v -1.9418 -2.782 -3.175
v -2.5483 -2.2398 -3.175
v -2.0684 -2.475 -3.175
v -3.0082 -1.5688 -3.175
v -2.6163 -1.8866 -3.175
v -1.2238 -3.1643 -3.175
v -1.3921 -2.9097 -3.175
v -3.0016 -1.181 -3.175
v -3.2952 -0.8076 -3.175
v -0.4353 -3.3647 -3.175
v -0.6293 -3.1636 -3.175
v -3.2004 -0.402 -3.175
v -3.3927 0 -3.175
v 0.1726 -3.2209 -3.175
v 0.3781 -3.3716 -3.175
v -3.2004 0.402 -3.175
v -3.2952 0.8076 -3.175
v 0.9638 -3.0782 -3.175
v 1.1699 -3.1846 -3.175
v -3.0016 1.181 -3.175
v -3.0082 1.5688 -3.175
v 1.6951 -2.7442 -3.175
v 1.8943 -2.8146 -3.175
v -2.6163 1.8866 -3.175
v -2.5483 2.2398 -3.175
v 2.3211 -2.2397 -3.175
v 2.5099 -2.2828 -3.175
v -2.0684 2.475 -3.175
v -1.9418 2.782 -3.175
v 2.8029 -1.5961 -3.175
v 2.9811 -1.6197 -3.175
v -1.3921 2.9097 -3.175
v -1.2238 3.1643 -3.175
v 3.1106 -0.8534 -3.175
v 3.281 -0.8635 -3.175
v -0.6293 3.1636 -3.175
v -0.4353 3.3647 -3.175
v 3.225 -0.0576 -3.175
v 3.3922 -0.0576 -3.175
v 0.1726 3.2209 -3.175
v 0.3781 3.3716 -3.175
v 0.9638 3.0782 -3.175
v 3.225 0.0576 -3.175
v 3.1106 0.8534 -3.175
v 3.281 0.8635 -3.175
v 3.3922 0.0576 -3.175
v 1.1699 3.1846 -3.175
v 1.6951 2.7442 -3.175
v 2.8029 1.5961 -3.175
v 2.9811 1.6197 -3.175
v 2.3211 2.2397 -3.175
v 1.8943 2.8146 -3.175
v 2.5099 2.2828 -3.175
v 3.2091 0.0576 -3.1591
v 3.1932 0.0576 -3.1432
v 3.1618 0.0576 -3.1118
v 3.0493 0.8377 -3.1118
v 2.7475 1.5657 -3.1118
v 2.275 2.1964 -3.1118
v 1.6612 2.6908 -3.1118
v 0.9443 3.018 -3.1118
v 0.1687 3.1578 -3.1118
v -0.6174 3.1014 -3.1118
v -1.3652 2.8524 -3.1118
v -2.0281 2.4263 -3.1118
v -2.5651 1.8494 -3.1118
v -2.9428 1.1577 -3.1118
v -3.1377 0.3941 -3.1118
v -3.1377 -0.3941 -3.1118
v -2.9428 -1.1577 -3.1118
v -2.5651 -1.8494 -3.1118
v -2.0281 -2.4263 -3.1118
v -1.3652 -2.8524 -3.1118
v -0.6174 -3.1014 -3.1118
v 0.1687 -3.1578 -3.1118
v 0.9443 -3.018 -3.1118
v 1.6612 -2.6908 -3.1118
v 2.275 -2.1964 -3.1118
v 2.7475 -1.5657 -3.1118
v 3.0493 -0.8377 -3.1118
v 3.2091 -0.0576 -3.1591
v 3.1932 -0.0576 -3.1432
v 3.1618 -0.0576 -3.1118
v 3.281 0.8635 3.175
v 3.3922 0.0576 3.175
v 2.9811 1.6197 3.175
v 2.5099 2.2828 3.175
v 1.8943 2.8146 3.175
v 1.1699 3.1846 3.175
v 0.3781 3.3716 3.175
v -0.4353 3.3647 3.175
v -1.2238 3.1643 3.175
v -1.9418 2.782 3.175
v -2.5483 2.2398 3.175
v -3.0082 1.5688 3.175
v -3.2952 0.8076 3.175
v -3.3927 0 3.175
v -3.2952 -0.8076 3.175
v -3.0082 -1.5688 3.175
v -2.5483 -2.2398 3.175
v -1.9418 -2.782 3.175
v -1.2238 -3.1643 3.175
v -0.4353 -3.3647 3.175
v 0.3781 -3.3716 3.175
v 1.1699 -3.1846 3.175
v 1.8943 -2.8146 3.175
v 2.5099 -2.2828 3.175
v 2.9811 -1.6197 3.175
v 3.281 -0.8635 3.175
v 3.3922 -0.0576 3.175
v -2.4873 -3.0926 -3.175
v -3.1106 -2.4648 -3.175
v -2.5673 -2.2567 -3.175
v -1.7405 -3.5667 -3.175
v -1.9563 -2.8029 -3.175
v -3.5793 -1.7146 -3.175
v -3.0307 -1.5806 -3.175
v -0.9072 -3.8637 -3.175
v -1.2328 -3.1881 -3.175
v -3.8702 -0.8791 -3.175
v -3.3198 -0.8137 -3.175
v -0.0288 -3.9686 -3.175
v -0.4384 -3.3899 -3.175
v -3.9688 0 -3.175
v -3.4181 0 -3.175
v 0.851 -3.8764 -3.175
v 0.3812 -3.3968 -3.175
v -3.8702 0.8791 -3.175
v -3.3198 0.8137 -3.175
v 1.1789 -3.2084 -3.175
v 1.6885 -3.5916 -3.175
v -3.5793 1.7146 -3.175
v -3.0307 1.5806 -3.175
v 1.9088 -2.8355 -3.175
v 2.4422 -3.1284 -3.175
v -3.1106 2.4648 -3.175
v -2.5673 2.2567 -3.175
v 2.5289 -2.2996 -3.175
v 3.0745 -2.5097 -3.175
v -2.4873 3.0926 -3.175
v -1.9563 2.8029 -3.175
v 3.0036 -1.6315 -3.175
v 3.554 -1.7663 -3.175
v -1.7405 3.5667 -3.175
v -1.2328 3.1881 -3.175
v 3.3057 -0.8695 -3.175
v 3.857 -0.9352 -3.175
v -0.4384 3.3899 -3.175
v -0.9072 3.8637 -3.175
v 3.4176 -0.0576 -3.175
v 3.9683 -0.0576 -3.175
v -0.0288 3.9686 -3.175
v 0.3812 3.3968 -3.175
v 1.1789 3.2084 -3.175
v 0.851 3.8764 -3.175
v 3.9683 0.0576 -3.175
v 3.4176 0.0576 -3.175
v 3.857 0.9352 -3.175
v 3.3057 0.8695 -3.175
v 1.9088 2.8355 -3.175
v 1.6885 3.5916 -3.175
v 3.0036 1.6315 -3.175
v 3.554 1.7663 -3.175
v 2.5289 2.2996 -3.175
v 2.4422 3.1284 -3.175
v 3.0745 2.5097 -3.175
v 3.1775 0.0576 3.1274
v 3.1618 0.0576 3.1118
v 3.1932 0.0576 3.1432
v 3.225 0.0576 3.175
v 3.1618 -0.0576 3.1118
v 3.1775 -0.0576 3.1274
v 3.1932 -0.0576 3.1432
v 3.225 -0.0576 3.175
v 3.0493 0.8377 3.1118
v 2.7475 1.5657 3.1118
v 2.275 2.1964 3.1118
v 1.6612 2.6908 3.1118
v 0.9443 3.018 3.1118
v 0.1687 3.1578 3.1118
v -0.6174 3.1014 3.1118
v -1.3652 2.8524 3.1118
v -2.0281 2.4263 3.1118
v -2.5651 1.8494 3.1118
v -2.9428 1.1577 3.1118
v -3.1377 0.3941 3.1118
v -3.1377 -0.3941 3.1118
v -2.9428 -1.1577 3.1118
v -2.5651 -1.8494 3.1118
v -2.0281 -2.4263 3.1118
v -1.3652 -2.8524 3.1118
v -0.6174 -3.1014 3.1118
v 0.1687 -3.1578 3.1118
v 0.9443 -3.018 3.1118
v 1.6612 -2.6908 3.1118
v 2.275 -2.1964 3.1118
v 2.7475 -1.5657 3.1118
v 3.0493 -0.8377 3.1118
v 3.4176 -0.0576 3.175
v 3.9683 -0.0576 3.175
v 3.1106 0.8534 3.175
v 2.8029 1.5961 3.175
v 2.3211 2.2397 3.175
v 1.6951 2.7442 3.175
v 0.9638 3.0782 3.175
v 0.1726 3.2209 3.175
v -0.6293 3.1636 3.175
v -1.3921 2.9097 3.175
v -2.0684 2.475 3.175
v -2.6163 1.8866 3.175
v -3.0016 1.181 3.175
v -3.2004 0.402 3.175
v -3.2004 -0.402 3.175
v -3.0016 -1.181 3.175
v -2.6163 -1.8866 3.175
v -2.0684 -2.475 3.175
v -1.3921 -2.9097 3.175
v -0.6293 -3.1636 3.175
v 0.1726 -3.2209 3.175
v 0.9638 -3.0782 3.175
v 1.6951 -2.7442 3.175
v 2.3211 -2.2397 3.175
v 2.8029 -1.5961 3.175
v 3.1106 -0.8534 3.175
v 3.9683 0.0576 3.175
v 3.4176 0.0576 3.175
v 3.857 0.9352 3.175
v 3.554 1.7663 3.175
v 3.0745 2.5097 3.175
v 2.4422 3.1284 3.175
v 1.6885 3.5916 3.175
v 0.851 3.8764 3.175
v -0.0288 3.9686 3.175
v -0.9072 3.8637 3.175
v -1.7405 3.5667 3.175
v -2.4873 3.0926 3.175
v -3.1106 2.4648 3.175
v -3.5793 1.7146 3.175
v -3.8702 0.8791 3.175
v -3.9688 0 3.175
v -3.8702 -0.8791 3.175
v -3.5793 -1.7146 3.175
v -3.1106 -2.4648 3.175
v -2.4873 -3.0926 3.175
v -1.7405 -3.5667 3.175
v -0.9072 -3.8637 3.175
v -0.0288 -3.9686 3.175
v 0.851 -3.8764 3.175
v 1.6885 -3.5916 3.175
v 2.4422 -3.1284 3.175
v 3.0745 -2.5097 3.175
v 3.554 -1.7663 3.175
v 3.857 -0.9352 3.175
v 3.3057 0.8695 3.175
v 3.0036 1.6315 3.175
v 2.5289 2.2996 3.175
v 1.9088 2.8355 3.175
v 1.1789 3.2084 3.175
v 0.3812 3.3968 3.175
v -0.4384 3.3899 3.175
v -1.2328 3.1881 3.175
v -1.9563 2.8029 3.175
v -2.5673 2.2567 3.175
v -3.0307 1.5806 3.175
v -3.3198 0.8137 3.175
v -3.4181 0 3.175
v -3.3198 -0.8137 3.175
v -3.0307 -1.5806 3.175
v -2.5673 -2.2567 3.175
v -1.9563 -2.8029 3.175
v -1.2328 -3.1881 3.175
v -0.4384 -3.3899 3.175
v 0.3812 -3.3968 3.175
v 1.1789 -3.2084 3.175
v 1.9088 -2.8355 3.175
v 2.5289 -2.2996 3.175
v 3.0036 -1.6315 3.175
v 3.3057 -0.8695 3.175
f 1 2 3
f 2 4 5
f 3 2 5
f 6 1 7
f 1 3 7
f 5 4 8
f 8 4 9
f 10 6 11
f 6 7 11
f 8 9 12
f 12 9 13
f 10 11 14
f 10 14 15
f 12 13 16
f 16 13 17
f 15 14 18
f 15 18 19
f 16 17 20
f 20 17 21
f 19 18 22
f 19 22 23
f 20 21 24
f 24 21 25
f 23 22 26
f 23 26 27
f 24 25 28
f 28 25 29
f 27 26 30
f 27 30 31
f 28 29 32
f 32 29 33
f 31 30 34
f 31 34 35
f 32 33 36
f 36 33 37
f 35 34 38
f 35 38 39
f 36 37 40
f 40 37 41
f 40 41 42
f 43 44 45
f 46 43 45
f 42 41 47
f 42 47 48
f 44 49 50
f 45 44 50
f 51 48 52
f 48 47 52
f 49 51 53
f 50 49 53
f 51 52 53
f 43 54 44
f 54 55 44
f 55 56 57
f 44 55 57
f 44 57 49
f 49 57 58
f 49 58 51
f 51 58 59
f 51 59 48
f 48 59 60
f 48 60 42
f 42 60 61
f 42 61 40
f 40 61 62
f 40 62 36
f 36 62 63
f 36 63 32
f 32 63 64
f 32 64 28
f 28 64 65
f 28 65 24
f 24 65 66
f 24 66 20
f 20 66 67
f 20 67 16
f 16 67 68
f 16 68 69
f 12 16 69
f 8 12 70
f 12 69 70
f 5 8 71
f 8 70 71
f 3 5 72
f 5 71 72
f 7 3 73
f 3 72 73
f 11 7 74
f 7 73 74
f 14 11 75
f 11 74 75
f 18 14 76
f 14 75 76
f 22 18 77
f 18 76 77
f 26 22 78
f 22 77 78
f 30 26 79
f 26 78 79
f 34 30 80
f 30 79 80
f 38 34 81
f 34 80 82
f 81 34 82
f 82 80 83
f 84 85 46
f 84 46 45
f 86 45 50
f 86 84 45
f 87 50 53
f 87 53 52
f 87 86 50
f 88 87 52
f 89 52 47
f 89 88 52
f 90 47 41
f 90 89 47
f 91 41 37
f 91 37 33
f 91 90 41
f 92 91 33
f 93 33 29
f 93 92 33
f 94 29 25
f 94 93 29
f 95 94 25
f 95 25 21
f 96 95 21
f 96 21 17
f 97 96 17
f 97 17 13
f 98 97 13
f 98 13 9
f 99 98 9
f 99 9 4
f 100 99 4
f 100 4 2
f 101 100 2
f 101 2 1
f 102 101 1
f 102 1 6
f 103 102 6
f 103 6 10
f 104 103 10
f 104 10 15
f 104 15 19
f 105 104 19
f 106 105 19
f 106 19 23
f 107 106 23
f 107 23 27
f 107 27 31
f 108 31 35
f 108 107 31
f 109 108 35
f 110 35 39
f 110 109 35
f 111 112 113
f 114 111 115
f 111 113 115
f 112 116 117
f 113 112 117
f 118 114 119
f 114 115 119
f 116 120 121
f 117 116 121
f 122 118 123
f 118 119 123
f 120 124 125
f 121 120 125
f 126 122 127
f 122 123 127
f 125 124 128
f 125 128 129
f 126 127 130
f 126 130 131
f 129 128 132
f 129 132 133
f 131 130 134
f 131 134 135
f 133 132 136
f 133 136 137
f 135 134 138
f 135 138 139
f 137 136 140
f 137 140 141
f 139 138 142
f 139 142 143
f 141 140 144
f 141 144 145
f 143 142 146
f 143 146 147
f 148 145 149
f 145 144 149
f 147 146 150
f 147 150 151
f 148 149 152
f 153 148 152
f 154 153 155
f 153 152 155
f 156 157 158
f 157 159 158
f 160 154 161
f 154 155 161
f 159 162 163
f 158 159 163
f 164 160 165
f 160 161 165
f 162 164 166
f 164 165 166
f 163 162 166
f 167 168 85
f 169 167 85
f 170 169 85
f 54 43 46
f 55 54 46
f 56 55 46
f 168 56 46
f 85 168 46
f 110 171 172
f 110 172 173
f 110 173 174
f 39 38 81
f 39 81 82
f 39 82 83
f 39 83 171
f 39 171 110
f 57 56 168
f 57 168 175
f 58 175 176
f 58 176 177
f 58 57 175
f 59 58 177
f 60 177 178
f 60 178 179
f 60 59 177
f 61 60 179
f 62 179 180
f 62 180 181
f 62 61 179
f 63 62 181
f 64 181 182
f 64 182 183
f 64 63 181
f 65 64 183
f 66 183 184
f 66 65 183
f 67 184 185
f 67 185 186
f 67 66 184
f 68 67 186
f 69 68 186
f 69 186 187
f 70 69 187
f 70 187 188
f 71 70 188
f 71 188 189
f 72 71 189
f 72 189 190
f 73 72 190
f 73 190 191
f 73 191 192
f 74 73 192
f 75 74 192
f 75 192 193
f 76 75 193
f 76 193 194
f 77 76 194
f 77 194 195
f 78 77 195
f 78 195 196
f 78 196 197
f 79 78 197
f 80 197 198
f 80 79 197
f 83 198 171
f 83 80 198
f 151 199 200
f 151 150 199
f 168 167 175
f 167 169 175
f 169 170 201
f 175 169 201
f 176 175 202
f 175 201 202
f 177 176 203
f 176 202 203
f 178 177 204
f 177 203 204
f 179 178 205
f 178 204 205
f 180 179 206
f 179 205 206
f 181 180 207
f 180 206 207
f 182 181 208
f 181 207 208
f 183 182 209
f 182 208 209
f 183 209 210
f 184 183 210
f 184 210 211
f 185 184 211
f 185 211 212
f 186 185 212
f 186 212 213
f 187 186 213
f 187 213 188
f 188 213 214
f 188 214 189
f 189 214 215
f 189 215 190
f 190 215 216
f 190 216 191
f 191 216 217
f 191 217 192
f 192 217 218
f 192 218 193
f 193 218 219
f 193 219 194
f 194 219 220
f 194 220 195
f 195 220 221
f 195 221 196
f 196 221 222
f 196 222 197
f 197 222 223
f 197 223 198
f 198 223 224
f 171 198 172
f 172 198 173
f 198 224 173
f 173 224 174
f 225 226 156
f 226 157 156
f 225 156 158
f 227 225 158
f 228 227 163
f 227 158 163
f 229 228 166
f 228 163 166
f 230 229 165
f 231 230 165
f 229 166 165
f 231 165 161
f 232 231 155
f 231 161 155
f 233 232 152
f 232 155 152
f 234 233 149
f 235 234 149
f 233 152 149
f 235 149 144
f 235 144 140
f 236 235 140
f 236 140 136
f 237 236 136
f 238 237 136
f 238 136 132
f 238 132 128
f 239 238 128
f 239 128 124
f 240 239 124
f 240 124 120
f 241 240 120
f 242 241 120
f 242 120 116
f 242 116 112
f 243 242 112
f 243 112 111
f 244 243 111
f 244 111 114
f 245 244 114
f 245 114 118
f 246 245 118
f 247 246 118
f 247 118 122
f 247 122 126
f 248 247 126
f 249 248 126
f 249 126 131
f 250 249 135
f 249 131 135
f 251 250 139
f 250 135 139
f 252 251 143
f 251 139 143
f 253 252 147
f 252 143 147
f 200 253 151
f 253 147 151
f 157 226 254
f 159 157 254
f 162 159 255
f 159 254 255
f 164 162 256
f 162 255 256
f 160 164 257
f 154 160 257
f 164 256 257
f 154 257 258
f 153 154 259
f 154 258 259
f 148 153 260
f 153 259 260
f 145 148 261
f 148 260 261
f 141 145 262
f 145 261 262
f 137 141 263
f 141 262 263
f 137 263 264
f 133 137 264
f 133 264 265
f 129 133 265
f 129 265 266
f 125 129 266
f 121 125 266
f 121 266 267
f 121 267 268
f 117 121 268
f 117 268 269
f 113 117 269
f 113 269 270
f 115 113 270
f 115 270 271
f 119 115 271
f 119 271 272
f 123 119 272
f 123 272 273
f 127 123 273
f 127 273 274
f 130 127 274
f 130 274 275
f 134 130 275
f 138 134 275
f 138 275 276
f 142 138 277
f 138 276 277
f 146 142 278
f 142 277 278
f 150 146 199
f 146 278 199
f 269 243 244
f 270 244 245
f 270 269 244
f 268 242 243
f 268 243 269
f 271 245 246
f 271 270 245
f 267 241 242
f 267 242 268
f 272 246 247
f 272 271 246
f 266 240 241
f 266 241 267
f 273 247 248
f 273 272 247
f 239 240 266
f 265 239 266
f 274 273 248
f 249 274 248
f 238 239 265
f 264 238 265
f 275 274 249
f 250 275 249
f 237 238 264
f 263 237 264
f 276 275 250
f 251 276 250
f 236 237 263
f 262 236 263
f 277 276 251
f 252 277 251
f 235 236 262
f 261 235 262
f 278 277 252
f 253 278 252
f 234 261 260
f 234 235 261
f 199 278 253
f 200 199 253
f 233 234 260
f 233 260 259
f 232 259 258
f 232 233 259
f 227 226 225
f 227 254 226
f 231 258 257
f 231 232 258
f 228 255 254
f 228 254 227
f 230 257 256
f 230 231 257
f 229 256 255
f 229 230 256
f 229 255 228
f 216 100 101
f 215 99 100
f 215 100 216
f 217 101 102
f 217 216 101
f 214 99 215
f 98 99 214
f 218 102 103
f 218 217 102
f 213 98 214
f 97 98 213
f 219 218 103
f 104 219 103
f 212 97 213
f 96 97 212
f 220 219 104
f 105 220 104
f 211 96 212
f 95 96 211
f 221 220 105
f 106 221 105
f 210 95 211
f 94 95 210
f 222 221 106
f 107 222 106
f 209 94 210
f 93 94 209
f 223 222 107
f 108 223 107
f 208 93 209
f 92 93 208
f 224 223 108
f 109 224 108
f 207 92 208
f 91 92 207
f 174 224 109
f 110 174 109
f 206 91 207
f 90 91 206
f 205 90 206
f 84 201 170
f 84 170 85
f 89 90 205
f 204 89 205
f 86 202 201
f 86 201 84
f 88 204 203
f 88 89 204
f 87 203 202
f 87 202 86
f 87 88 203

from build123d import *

# Parameters (mm, degrees)
BOSS_EXTRUDE1_DEPTH          = 3.175
BOSS_EXTRUDE1_DEPTH_BACK     = 3.175
SKETCH3_R                    = 3.96875
SKETCH3_R_2                  = 3.1623
SKETCH4_R                    = 3.418114286
SKETCH4_R_2                  = 3.392714286
CUT_EXTRUDE_THIN1_DEPTH      = 9.474930863
CHAMFER1_SIZE                = 0.063246
CUT_EXTRUDE_THIN3_DEPTH      = 9.474930863
CUT_EXTRUDE_THIN3_DEPTH_BACK = 9.474930863
SKETCH5_W                    = 4.053825817
SKETCH5_H                    = 0.115207142


with BuildPart() as part:
    # Sketch3 → Boss-Extrude1 (new, two sides: drawn at the far end of the back side and taken through both)
    with BuildSketch(Plane.XY.offset(-BOSS_EXTRUDE1_DEPTH_BACK)):
        Circle(SKETCH3_R)
        Circle(SKETCH3_R_2, mode=Mode.SUBTRACT)
    extrude(amount=BOSS_EXTRUDE1_DEPTH + BOSS_EXTRUDE1_DEPTH_BACK)

    # Sketch4 → Cut-Extrude-Thin1 (cut, through all)
    with BuildSketch(Plane.XY.offset(3.175)):
        Circle(SKETCH4_R)
        Circle(SKETCH4_R_2, mode=Mode.SUBTRACT)
    extrude(amount=-CUT_EXTRUDE_THIN1_DEPTH, mode=Mode.SUBTRACT)


with BuildPart() as cut_extrude_thin1_piece_1:
    # of the separate pieces the step leaves, piece 1, a body of its own (cut_extrude_thin1_pieces)
    add(part.part.solids().sort_by_distance((3.96875, 0, 0))[0])


with BuildPart() as cut_extrude_thin1_piece_2:
    # of the separate pieces the step leaves, piece 2, a body of its own (cut_extrude_thin1_pieces)
    add(part.part.solids().sort_by_distance((3.392714286, 0, 3.175))[0])

    # Chamfer1
    chamfer1_edges = [cut_extrude_thin1_piece_2.edges().sort_by_distance(p)[0] for p in [
        (-3.1623, 0, -3.175),
        (-3.1623, 0, 3.175),
    ]]
    chamfer(chamfer1_edges, length=CHAMFER1_SIZE)


with BuildPart() as cut_extrude_thin3_tool:
    # Sketch5 → Cut-Extrude-Thin3 (new, two sides: drawn at the far end of the back side and taken through both)
    with BuildSketch(Plane.XY.offset(3.175).offset(-CUT_EXTRUDE_THIN3_DEPTH_BACK)):
        with Locations((2.026912908, 0)):
            Rectangle(SKETCH5_W, SKETCH5_H)
    extrude(amount=CUT_EXTRUDE_THIN3_DEPTH + CUT_EXTRUDE_THIN3_DEPTH_BACK)


with BuildPart() as cut_extrude_thin1_piece_1_1:
    add(cut_extrude_thin1_piece_1.part)

    # Cut-Extrude-Thin3: cut by cut_extrude_thin3_tool
    add(cut_extrude_thin3_tool.part, mode=Mode.SUBTRACT)


with BuildPart() as cut_extrude_thin1_piece_2_1:
    add(cut_extrude_thin1_piece_2.part)

    # Cut-Extrude-Thin3: cut by cut_extrude_thin3_tool
    add(cut_extrude_thin3_tool.part, mode=Mode.SUBTRACT)


solid = Compound([cut_extrude_thin1_piece_1_1.part, cut_extrude_thin1_piece_2_1.part])
